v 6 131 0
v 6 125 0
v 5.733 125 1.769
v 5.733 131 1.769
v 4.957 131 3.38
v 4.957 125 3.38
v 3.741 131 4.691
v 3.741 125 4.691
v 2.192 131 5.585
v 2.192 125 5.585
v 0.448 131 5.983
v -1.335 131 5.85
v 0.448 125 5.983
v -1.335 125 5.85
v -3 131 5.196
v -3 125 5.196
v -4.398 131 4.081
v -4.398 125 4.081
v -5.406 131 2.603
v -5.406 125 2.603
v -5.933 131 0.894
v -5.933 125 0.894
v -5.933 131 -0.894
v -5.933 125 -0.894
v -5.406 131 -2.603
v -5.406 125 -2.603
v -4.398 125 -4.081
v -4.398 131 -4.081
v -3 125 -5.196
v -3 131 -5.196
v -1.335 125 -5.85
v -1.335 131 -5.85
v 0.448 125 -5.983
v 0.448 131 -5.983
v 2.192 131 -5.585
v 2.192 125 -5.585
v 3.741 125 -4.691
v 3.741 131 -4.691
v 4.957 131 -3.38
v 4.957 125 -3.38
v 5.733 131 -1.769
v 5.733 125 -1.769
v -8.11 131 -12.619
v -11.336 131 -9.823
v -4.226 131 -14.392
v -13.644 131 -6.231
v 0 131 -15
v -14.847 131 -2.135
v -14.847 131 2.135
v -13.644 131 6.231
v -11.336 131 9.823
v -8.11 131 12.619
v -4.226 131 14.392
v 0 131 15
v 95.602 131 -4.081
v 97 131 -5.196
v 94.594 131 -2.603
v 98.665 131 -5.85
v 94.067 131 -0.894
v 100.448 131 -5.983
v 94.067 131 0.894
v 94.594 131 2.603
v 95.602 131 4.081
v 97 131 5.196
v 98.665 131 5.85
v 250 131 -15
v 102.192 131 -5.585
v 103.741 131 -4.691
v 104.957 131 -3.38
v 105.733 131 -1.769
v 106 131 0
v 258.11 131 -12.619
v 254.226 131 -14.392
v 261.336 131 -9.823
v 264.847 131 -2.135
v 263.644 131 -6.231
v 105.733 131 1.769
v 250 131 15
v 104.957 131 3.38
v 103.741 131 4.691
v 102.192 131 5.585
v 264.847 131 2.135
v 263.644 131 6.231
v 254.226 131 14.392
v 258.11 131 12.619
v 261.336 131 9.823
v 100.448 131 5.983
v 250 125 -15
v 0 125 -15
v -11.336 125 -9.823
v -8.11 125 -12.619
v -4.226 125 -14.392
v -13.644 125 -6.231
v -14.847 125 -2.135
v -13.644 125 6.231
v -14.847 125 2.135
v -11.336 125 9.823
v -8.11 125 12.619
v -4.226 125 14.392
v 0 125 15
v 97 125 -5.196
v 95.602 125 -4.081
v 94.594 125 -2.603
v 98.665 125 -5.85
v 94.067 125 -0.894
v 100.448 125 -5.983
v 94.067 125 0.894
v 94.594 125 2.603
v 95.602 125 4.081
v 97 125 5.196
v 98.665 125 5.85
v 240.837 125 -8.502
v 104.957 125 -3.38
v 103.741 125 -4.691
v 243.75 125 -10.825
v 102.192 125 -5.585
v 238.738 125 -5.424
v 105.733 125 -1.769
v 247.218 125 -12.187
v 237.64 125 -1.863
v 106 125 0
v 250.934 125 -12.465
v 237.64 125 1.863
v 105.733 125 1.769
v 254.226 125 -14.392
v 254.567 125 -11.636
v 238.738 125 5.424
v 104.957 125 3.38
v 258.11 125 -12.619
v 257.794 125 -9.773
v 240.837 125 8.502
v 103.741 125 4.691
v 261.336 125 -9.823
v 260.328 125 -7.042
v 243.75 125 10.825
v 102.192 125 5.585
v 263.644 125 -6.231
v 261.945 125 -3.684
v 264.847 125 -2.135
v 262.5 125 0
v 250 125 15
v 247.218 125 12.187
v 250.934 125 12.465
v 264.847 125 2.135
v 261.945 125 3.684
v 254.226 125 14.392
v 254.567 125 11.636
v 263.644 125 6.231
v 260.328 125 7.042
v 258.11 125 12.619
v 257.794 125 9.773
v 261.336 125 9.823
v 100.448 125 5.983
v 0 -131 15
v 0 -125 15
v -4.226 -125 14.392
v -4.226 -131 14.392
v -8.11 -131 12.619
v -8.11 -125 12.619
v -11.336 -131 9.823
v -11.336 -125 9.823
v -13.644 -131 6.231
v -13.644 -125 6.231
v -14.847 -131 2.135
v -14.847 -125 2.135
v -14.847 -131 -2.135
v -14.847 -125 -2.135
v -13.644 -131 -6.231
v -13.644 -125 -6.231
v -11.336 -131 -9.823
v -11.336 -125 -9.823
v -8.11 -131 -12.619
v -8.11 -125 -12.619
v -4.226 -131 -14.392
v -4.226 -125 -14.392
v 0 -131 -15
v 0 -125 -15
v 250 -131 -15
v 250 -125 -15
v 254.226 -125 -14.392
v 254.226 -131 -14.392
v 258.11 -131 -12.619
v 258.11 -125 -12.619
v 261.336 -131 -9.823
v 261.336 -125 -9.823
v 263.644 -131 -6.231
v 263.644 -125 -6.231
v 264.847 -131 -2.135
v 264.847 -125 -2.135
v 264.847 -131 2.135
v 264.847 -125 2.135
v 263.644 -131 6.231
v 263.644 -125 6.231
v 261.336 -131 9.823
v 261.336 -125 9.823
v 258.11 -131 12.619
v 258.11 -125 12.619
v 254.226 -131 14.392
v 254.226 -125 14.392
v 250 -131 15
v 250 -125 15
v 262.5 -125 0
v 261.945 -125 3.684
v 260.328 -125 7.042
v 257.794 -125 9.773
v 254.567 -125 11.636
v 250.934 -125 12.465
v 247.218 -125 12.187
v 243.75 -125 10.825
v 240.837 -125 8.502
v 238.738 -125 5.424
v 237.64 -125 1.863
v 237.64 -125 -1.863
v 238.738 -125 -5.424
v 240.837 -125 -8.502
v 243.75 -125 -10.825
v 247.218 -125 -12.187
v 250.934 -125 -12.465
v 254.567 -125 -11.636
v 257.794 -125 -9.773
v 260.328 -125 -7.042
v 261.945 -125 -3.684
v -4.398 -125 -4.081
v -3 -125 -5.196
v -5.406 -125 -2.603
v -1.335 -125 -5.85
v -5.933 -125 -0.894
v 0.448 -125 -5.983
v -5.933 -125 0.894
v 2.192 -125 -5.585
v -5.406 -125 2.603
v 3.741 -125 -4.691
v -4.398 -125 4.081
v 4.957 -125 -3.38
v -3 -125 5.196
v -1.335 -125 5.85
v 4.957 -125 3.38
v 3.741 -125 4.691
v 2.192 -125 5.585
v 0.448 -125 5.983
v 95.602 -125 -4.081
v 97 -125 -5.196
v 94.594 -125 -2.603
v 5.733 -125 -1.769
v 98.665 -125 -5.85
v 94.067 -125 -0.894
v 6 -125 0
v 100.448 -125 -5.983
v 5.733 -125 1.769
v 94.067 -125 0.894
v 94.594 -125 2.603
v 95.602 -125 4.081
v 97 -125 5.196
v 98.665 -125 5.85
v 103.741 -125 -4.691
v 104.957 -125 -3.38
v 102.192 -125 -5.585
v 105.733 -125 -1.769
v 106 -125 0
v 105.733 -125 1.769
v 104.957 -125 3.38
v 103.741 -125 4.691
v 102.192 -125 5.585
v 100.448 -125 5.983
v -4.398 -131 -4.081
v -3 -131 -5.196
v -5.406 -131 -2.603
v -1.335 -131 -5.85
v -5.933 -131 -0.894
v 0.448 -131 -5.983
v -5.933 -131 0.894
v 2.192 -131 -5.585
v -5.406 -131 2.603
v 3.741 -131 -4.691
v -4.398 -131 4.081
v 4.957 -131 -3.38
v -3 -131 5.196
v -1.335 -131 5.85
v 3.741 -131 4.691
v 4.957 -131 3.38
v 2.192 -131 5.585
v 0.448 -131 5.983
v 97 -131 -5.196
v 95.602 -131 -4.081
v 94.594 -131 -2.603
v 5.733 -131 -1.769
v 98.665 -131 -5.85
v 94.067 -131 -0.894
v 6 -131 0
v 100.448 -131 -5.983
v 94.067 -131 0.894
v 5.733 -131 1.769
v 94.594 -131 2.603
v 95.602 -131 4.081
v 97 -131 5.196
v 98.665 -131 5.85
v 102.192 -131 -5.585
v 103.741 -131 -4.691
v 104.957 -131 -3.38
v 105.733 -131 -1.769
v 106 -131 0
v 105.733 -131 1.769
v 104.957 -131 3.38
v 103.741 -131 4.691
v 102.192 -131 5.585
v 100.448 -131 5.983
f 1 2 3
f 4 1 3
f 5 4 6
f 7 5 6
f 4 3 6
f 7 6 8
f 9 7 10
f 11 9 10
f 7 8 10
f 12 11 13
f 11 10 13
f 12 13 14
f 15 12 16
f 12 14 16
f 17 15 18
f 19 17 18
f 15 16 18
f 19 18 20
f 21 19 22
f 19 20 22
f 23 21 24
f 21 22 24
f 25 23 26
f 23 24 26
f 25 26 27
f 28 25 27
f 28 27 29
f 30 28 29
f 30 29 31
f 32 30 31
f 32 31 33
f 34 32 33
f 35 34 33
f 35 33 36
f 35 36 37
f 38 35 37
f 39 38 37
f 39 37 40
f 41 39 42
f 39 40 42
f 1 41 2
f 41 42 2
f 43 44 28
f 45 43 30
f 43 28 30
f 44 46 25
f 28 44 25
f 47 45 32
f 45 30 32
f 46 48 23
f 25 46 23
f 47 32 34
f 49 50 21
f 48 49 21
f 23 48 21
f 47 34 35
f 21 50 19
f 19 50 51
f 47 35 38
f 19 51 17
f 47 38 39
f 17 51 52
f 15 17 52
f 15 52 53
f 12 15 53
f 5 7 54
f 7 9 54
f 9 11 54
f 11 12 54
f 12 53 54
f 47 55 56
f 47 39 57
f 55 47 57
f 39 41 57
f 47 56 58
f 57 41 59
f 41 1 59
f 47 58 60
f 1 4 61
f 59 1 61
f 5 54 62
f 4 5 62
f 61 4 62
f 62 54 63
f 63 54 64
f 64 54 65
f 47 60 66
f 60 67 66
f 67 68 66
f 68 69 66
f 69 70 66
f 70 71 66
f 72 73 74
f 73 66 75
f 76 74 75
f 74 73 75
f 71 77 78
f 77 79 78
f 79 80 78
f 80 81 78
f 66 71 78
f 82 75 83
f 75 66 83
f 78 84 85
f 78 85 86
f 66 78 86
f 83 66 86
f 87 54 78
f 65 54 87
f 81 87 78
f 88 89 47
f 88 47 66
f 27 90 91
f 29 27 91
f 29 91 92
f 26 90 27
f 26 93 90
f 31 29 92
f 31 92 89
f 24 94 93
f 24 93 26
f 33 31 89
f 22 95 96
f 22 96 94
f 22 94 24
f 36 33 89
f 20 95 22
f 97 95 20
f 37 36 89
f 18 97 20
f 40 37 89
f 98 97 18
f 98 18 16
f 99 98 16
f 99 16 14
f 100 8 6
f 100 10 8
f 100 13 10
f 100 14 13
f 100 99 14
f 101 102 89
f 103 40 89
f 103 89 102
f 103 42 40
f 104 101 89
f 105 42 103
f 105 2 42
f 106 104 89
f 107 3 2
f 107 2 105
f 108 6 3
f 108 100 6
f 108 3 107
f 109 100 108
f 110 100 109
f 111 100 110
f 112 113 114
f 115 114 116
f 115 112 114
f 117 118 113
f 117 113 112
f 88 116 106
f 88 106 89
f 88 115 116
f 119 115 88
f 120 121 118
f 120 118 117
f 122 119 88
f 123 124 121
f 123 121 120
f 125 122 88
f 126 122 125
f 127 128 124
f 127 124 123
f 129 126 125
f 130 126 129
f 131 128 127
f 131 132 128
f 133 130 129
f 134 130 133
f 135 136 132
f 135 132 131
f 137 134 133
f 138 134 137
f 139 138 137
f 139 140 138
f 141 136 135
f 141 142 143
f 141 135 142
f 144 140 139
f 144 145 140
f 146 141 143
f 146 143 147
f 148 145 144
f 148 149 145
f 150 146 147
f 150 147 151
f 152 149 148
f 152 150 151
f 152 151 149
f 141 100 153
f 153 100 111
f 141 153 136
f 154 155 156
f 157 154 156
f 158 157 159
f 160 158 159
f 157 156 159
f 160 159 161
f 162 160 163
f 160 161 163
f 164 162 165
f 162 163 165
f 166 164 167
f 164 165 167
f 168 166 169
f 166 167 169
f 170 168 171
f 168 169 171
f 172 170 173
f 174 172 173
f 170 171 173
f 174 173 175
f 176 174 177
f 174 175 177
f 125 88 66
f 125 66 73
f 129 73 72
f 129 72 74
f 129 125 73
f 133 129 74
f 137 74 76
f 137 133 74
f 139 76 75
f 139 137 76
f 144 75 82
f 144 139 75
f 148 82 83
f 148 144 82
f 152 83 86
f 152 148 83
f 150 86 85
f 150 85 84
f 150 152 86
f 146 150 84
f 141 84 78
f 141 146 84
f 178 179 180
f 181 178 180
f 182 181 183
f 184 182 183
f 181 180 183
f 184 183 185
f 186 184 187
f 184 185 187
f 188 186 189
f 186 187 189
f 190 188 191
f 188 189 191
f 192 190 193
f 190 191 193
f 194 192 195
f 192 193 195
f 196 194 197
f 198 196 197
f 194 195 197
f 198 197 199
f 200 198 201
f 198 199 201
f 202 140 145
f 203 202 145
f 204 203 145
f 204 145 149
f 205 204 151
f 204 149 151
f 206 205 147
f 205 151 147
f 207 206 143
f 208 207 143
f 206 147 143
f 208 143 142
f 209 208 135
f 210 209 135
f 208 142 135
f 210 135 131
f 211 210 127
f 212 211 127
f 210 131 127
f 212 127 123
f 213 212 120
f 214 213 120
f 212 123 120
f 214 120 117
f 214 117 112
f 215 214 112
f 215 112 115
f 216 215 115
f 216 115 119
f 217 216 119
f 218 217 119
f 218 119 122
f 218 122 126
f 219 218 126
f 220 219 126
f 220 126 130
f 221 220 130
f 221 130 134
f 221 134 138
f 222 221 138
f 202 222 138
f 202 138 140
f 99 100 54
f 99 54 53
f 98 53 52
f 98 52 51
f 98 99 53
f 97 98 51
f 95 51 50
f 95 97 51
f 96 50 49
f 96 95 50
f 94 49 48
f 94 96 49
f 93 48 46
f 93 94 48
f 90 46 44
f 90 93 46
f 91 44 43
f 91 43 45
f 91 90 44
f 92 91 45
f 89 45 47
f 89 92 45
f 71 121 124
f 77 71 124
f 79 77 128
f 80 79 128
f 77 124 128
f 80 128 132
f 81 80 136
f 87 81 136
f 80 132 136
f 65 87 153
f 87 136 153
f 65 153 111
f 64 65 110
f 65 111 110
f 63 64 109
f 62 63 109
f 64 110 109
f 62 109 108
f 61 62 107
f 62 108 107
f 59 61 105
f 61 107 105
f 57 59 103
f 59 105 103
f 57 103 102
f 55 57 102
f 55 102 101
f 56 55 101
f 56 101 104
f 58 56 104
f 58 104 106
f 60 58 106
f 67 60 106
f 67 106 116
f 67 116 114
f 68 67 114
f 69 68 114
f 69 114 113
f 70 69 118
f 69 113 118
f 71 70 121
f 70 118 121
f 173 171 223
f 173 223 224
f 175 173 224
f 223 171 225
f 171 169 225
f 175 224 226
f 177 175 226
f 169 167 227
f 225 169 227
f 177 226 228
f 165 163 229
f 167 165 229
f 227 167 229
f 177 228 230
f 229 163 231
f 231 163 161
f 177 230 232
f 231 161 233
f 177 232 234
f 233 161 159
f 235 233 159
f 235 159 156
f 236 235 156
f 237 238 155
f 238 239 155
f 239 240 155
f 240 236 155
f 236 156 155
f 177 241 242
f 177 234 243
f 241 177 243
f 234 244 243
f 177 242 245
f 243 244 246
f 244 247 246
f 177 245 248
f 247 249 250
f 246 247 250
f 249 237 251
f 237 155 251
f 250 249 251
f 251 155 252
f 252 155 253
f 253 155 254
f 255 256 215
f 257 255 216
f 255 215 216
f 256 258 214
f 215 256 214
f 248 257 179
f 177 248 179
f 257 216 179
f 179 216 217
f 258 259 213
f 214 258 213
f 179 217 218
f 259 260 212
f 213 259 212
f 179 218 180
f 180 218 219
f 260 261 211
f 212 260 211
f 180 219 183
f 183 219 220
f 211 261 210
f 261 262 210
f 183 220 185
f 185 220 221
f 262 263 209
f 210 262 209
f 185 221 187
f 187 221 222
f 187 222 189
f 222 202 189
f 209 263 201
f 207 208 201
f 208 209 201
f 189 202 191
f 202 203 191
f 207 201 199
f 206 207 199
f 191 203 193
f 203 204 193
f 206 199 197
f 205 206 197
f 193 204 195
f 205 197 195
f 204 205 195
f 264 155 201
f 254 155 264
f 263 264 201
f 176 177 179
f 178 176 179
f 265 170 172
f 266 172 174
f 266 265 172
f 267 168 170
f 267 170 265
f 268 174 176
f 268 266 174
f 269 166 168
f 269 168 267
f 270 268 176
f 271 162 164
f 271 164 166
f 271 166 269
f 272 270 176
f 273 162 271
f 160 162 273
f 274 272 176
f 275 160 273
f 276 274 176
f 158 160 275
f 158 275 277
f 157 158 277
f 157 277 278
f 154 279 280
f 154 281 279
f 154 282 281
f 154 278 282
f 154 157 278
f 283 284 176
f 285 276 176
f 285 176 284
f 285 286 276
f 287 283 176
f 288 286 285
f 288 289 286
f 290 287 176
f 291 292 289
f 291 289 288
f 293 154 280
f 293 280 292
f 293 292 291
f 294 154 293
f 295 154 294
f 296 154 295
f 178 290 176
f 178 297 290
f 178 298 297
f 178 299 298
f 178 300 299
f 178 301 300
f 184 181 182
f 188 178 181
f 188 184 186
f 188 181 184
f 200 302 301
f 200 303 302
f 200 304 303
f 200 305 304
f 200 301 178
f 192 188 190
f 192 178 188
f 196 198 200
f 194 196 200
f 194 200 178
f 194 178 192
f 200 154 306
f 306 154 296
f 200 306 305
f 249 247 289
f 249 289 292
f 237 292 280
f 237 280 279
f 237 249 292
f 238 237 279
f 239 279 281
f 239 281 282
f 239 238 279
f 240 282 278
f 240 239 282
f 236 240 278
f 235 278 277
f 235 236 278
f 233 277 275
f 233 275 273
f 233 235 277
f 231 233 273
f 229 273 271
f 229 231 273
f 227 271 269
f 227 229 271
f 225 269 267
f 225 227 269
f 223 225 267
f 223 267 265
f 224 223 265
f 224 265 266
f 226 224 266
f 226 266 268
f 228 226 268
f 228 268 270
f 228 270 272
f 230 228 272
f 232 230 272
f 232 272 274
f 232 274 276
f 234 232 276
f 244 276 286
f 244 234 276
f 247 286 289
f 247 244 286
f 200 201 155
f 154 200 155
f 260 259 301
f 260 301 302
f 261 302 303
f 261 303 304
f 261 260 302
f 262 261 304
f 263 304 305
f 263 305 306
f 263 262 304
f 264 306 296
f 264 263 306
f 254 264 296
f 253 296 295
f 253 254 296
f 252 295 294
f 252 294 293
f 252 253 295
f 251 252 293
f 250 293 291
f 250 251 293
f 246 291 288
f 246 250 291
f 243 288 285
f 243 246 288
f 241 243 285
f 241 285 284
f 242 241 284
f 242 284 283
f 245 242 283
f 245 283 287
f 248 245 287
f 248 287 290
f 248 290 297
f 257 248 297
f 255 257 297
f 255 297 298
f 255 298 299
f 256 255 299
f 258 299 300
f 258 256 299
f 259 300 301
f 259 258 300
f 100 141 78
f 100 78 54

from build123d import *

# Parameters (mm, degrees)
F1_R     = 6
F1_R_2   = 12.5
F2_DEPTH = 6
F3_DEPTH = 125


with BuildPart() as f2:
    # F1 (on offset) → F2 (new body)
    with BuildSketch(Plane.XZ.offset(125)):
        with BuildLine():
            Line((250, 15), (0, 15))
            ThreePointArc((0, 15), (-15, 0), (0, -15))
            Line((0, -15), (250, -15))
            ThreePointArc((250, -15), (265, 0), (250, 15))
        make_face()
        Circle(F1_R, mode=Mode.SUBTRACT)
        with Locations((100, 0)):
            Circle(F1_R, mode=Mode.SUBTRACT)
        with Locations((250, 0)):
            Circle(F1_R_2, mode=Mode.SUBTRACT)
        with Locations((250, 0)):
            Circle(F1_R_2)
    extrude(amount=F2_DEPTH)

    # F1 (on offset) → F3 (join, through all)
    with BuildSketch(Plane.XZ.offset(125)):
        with Locations((250, 0)):
            Circle(F1_R_2)
    extrude(amount=-F3_DEPTH)

    # F4: F2 across plane


with BuildPart() as f2_1:
    add(f2.part)
    add(f2.part.mirror(Plane.XZ))


solid = f2_1.part
